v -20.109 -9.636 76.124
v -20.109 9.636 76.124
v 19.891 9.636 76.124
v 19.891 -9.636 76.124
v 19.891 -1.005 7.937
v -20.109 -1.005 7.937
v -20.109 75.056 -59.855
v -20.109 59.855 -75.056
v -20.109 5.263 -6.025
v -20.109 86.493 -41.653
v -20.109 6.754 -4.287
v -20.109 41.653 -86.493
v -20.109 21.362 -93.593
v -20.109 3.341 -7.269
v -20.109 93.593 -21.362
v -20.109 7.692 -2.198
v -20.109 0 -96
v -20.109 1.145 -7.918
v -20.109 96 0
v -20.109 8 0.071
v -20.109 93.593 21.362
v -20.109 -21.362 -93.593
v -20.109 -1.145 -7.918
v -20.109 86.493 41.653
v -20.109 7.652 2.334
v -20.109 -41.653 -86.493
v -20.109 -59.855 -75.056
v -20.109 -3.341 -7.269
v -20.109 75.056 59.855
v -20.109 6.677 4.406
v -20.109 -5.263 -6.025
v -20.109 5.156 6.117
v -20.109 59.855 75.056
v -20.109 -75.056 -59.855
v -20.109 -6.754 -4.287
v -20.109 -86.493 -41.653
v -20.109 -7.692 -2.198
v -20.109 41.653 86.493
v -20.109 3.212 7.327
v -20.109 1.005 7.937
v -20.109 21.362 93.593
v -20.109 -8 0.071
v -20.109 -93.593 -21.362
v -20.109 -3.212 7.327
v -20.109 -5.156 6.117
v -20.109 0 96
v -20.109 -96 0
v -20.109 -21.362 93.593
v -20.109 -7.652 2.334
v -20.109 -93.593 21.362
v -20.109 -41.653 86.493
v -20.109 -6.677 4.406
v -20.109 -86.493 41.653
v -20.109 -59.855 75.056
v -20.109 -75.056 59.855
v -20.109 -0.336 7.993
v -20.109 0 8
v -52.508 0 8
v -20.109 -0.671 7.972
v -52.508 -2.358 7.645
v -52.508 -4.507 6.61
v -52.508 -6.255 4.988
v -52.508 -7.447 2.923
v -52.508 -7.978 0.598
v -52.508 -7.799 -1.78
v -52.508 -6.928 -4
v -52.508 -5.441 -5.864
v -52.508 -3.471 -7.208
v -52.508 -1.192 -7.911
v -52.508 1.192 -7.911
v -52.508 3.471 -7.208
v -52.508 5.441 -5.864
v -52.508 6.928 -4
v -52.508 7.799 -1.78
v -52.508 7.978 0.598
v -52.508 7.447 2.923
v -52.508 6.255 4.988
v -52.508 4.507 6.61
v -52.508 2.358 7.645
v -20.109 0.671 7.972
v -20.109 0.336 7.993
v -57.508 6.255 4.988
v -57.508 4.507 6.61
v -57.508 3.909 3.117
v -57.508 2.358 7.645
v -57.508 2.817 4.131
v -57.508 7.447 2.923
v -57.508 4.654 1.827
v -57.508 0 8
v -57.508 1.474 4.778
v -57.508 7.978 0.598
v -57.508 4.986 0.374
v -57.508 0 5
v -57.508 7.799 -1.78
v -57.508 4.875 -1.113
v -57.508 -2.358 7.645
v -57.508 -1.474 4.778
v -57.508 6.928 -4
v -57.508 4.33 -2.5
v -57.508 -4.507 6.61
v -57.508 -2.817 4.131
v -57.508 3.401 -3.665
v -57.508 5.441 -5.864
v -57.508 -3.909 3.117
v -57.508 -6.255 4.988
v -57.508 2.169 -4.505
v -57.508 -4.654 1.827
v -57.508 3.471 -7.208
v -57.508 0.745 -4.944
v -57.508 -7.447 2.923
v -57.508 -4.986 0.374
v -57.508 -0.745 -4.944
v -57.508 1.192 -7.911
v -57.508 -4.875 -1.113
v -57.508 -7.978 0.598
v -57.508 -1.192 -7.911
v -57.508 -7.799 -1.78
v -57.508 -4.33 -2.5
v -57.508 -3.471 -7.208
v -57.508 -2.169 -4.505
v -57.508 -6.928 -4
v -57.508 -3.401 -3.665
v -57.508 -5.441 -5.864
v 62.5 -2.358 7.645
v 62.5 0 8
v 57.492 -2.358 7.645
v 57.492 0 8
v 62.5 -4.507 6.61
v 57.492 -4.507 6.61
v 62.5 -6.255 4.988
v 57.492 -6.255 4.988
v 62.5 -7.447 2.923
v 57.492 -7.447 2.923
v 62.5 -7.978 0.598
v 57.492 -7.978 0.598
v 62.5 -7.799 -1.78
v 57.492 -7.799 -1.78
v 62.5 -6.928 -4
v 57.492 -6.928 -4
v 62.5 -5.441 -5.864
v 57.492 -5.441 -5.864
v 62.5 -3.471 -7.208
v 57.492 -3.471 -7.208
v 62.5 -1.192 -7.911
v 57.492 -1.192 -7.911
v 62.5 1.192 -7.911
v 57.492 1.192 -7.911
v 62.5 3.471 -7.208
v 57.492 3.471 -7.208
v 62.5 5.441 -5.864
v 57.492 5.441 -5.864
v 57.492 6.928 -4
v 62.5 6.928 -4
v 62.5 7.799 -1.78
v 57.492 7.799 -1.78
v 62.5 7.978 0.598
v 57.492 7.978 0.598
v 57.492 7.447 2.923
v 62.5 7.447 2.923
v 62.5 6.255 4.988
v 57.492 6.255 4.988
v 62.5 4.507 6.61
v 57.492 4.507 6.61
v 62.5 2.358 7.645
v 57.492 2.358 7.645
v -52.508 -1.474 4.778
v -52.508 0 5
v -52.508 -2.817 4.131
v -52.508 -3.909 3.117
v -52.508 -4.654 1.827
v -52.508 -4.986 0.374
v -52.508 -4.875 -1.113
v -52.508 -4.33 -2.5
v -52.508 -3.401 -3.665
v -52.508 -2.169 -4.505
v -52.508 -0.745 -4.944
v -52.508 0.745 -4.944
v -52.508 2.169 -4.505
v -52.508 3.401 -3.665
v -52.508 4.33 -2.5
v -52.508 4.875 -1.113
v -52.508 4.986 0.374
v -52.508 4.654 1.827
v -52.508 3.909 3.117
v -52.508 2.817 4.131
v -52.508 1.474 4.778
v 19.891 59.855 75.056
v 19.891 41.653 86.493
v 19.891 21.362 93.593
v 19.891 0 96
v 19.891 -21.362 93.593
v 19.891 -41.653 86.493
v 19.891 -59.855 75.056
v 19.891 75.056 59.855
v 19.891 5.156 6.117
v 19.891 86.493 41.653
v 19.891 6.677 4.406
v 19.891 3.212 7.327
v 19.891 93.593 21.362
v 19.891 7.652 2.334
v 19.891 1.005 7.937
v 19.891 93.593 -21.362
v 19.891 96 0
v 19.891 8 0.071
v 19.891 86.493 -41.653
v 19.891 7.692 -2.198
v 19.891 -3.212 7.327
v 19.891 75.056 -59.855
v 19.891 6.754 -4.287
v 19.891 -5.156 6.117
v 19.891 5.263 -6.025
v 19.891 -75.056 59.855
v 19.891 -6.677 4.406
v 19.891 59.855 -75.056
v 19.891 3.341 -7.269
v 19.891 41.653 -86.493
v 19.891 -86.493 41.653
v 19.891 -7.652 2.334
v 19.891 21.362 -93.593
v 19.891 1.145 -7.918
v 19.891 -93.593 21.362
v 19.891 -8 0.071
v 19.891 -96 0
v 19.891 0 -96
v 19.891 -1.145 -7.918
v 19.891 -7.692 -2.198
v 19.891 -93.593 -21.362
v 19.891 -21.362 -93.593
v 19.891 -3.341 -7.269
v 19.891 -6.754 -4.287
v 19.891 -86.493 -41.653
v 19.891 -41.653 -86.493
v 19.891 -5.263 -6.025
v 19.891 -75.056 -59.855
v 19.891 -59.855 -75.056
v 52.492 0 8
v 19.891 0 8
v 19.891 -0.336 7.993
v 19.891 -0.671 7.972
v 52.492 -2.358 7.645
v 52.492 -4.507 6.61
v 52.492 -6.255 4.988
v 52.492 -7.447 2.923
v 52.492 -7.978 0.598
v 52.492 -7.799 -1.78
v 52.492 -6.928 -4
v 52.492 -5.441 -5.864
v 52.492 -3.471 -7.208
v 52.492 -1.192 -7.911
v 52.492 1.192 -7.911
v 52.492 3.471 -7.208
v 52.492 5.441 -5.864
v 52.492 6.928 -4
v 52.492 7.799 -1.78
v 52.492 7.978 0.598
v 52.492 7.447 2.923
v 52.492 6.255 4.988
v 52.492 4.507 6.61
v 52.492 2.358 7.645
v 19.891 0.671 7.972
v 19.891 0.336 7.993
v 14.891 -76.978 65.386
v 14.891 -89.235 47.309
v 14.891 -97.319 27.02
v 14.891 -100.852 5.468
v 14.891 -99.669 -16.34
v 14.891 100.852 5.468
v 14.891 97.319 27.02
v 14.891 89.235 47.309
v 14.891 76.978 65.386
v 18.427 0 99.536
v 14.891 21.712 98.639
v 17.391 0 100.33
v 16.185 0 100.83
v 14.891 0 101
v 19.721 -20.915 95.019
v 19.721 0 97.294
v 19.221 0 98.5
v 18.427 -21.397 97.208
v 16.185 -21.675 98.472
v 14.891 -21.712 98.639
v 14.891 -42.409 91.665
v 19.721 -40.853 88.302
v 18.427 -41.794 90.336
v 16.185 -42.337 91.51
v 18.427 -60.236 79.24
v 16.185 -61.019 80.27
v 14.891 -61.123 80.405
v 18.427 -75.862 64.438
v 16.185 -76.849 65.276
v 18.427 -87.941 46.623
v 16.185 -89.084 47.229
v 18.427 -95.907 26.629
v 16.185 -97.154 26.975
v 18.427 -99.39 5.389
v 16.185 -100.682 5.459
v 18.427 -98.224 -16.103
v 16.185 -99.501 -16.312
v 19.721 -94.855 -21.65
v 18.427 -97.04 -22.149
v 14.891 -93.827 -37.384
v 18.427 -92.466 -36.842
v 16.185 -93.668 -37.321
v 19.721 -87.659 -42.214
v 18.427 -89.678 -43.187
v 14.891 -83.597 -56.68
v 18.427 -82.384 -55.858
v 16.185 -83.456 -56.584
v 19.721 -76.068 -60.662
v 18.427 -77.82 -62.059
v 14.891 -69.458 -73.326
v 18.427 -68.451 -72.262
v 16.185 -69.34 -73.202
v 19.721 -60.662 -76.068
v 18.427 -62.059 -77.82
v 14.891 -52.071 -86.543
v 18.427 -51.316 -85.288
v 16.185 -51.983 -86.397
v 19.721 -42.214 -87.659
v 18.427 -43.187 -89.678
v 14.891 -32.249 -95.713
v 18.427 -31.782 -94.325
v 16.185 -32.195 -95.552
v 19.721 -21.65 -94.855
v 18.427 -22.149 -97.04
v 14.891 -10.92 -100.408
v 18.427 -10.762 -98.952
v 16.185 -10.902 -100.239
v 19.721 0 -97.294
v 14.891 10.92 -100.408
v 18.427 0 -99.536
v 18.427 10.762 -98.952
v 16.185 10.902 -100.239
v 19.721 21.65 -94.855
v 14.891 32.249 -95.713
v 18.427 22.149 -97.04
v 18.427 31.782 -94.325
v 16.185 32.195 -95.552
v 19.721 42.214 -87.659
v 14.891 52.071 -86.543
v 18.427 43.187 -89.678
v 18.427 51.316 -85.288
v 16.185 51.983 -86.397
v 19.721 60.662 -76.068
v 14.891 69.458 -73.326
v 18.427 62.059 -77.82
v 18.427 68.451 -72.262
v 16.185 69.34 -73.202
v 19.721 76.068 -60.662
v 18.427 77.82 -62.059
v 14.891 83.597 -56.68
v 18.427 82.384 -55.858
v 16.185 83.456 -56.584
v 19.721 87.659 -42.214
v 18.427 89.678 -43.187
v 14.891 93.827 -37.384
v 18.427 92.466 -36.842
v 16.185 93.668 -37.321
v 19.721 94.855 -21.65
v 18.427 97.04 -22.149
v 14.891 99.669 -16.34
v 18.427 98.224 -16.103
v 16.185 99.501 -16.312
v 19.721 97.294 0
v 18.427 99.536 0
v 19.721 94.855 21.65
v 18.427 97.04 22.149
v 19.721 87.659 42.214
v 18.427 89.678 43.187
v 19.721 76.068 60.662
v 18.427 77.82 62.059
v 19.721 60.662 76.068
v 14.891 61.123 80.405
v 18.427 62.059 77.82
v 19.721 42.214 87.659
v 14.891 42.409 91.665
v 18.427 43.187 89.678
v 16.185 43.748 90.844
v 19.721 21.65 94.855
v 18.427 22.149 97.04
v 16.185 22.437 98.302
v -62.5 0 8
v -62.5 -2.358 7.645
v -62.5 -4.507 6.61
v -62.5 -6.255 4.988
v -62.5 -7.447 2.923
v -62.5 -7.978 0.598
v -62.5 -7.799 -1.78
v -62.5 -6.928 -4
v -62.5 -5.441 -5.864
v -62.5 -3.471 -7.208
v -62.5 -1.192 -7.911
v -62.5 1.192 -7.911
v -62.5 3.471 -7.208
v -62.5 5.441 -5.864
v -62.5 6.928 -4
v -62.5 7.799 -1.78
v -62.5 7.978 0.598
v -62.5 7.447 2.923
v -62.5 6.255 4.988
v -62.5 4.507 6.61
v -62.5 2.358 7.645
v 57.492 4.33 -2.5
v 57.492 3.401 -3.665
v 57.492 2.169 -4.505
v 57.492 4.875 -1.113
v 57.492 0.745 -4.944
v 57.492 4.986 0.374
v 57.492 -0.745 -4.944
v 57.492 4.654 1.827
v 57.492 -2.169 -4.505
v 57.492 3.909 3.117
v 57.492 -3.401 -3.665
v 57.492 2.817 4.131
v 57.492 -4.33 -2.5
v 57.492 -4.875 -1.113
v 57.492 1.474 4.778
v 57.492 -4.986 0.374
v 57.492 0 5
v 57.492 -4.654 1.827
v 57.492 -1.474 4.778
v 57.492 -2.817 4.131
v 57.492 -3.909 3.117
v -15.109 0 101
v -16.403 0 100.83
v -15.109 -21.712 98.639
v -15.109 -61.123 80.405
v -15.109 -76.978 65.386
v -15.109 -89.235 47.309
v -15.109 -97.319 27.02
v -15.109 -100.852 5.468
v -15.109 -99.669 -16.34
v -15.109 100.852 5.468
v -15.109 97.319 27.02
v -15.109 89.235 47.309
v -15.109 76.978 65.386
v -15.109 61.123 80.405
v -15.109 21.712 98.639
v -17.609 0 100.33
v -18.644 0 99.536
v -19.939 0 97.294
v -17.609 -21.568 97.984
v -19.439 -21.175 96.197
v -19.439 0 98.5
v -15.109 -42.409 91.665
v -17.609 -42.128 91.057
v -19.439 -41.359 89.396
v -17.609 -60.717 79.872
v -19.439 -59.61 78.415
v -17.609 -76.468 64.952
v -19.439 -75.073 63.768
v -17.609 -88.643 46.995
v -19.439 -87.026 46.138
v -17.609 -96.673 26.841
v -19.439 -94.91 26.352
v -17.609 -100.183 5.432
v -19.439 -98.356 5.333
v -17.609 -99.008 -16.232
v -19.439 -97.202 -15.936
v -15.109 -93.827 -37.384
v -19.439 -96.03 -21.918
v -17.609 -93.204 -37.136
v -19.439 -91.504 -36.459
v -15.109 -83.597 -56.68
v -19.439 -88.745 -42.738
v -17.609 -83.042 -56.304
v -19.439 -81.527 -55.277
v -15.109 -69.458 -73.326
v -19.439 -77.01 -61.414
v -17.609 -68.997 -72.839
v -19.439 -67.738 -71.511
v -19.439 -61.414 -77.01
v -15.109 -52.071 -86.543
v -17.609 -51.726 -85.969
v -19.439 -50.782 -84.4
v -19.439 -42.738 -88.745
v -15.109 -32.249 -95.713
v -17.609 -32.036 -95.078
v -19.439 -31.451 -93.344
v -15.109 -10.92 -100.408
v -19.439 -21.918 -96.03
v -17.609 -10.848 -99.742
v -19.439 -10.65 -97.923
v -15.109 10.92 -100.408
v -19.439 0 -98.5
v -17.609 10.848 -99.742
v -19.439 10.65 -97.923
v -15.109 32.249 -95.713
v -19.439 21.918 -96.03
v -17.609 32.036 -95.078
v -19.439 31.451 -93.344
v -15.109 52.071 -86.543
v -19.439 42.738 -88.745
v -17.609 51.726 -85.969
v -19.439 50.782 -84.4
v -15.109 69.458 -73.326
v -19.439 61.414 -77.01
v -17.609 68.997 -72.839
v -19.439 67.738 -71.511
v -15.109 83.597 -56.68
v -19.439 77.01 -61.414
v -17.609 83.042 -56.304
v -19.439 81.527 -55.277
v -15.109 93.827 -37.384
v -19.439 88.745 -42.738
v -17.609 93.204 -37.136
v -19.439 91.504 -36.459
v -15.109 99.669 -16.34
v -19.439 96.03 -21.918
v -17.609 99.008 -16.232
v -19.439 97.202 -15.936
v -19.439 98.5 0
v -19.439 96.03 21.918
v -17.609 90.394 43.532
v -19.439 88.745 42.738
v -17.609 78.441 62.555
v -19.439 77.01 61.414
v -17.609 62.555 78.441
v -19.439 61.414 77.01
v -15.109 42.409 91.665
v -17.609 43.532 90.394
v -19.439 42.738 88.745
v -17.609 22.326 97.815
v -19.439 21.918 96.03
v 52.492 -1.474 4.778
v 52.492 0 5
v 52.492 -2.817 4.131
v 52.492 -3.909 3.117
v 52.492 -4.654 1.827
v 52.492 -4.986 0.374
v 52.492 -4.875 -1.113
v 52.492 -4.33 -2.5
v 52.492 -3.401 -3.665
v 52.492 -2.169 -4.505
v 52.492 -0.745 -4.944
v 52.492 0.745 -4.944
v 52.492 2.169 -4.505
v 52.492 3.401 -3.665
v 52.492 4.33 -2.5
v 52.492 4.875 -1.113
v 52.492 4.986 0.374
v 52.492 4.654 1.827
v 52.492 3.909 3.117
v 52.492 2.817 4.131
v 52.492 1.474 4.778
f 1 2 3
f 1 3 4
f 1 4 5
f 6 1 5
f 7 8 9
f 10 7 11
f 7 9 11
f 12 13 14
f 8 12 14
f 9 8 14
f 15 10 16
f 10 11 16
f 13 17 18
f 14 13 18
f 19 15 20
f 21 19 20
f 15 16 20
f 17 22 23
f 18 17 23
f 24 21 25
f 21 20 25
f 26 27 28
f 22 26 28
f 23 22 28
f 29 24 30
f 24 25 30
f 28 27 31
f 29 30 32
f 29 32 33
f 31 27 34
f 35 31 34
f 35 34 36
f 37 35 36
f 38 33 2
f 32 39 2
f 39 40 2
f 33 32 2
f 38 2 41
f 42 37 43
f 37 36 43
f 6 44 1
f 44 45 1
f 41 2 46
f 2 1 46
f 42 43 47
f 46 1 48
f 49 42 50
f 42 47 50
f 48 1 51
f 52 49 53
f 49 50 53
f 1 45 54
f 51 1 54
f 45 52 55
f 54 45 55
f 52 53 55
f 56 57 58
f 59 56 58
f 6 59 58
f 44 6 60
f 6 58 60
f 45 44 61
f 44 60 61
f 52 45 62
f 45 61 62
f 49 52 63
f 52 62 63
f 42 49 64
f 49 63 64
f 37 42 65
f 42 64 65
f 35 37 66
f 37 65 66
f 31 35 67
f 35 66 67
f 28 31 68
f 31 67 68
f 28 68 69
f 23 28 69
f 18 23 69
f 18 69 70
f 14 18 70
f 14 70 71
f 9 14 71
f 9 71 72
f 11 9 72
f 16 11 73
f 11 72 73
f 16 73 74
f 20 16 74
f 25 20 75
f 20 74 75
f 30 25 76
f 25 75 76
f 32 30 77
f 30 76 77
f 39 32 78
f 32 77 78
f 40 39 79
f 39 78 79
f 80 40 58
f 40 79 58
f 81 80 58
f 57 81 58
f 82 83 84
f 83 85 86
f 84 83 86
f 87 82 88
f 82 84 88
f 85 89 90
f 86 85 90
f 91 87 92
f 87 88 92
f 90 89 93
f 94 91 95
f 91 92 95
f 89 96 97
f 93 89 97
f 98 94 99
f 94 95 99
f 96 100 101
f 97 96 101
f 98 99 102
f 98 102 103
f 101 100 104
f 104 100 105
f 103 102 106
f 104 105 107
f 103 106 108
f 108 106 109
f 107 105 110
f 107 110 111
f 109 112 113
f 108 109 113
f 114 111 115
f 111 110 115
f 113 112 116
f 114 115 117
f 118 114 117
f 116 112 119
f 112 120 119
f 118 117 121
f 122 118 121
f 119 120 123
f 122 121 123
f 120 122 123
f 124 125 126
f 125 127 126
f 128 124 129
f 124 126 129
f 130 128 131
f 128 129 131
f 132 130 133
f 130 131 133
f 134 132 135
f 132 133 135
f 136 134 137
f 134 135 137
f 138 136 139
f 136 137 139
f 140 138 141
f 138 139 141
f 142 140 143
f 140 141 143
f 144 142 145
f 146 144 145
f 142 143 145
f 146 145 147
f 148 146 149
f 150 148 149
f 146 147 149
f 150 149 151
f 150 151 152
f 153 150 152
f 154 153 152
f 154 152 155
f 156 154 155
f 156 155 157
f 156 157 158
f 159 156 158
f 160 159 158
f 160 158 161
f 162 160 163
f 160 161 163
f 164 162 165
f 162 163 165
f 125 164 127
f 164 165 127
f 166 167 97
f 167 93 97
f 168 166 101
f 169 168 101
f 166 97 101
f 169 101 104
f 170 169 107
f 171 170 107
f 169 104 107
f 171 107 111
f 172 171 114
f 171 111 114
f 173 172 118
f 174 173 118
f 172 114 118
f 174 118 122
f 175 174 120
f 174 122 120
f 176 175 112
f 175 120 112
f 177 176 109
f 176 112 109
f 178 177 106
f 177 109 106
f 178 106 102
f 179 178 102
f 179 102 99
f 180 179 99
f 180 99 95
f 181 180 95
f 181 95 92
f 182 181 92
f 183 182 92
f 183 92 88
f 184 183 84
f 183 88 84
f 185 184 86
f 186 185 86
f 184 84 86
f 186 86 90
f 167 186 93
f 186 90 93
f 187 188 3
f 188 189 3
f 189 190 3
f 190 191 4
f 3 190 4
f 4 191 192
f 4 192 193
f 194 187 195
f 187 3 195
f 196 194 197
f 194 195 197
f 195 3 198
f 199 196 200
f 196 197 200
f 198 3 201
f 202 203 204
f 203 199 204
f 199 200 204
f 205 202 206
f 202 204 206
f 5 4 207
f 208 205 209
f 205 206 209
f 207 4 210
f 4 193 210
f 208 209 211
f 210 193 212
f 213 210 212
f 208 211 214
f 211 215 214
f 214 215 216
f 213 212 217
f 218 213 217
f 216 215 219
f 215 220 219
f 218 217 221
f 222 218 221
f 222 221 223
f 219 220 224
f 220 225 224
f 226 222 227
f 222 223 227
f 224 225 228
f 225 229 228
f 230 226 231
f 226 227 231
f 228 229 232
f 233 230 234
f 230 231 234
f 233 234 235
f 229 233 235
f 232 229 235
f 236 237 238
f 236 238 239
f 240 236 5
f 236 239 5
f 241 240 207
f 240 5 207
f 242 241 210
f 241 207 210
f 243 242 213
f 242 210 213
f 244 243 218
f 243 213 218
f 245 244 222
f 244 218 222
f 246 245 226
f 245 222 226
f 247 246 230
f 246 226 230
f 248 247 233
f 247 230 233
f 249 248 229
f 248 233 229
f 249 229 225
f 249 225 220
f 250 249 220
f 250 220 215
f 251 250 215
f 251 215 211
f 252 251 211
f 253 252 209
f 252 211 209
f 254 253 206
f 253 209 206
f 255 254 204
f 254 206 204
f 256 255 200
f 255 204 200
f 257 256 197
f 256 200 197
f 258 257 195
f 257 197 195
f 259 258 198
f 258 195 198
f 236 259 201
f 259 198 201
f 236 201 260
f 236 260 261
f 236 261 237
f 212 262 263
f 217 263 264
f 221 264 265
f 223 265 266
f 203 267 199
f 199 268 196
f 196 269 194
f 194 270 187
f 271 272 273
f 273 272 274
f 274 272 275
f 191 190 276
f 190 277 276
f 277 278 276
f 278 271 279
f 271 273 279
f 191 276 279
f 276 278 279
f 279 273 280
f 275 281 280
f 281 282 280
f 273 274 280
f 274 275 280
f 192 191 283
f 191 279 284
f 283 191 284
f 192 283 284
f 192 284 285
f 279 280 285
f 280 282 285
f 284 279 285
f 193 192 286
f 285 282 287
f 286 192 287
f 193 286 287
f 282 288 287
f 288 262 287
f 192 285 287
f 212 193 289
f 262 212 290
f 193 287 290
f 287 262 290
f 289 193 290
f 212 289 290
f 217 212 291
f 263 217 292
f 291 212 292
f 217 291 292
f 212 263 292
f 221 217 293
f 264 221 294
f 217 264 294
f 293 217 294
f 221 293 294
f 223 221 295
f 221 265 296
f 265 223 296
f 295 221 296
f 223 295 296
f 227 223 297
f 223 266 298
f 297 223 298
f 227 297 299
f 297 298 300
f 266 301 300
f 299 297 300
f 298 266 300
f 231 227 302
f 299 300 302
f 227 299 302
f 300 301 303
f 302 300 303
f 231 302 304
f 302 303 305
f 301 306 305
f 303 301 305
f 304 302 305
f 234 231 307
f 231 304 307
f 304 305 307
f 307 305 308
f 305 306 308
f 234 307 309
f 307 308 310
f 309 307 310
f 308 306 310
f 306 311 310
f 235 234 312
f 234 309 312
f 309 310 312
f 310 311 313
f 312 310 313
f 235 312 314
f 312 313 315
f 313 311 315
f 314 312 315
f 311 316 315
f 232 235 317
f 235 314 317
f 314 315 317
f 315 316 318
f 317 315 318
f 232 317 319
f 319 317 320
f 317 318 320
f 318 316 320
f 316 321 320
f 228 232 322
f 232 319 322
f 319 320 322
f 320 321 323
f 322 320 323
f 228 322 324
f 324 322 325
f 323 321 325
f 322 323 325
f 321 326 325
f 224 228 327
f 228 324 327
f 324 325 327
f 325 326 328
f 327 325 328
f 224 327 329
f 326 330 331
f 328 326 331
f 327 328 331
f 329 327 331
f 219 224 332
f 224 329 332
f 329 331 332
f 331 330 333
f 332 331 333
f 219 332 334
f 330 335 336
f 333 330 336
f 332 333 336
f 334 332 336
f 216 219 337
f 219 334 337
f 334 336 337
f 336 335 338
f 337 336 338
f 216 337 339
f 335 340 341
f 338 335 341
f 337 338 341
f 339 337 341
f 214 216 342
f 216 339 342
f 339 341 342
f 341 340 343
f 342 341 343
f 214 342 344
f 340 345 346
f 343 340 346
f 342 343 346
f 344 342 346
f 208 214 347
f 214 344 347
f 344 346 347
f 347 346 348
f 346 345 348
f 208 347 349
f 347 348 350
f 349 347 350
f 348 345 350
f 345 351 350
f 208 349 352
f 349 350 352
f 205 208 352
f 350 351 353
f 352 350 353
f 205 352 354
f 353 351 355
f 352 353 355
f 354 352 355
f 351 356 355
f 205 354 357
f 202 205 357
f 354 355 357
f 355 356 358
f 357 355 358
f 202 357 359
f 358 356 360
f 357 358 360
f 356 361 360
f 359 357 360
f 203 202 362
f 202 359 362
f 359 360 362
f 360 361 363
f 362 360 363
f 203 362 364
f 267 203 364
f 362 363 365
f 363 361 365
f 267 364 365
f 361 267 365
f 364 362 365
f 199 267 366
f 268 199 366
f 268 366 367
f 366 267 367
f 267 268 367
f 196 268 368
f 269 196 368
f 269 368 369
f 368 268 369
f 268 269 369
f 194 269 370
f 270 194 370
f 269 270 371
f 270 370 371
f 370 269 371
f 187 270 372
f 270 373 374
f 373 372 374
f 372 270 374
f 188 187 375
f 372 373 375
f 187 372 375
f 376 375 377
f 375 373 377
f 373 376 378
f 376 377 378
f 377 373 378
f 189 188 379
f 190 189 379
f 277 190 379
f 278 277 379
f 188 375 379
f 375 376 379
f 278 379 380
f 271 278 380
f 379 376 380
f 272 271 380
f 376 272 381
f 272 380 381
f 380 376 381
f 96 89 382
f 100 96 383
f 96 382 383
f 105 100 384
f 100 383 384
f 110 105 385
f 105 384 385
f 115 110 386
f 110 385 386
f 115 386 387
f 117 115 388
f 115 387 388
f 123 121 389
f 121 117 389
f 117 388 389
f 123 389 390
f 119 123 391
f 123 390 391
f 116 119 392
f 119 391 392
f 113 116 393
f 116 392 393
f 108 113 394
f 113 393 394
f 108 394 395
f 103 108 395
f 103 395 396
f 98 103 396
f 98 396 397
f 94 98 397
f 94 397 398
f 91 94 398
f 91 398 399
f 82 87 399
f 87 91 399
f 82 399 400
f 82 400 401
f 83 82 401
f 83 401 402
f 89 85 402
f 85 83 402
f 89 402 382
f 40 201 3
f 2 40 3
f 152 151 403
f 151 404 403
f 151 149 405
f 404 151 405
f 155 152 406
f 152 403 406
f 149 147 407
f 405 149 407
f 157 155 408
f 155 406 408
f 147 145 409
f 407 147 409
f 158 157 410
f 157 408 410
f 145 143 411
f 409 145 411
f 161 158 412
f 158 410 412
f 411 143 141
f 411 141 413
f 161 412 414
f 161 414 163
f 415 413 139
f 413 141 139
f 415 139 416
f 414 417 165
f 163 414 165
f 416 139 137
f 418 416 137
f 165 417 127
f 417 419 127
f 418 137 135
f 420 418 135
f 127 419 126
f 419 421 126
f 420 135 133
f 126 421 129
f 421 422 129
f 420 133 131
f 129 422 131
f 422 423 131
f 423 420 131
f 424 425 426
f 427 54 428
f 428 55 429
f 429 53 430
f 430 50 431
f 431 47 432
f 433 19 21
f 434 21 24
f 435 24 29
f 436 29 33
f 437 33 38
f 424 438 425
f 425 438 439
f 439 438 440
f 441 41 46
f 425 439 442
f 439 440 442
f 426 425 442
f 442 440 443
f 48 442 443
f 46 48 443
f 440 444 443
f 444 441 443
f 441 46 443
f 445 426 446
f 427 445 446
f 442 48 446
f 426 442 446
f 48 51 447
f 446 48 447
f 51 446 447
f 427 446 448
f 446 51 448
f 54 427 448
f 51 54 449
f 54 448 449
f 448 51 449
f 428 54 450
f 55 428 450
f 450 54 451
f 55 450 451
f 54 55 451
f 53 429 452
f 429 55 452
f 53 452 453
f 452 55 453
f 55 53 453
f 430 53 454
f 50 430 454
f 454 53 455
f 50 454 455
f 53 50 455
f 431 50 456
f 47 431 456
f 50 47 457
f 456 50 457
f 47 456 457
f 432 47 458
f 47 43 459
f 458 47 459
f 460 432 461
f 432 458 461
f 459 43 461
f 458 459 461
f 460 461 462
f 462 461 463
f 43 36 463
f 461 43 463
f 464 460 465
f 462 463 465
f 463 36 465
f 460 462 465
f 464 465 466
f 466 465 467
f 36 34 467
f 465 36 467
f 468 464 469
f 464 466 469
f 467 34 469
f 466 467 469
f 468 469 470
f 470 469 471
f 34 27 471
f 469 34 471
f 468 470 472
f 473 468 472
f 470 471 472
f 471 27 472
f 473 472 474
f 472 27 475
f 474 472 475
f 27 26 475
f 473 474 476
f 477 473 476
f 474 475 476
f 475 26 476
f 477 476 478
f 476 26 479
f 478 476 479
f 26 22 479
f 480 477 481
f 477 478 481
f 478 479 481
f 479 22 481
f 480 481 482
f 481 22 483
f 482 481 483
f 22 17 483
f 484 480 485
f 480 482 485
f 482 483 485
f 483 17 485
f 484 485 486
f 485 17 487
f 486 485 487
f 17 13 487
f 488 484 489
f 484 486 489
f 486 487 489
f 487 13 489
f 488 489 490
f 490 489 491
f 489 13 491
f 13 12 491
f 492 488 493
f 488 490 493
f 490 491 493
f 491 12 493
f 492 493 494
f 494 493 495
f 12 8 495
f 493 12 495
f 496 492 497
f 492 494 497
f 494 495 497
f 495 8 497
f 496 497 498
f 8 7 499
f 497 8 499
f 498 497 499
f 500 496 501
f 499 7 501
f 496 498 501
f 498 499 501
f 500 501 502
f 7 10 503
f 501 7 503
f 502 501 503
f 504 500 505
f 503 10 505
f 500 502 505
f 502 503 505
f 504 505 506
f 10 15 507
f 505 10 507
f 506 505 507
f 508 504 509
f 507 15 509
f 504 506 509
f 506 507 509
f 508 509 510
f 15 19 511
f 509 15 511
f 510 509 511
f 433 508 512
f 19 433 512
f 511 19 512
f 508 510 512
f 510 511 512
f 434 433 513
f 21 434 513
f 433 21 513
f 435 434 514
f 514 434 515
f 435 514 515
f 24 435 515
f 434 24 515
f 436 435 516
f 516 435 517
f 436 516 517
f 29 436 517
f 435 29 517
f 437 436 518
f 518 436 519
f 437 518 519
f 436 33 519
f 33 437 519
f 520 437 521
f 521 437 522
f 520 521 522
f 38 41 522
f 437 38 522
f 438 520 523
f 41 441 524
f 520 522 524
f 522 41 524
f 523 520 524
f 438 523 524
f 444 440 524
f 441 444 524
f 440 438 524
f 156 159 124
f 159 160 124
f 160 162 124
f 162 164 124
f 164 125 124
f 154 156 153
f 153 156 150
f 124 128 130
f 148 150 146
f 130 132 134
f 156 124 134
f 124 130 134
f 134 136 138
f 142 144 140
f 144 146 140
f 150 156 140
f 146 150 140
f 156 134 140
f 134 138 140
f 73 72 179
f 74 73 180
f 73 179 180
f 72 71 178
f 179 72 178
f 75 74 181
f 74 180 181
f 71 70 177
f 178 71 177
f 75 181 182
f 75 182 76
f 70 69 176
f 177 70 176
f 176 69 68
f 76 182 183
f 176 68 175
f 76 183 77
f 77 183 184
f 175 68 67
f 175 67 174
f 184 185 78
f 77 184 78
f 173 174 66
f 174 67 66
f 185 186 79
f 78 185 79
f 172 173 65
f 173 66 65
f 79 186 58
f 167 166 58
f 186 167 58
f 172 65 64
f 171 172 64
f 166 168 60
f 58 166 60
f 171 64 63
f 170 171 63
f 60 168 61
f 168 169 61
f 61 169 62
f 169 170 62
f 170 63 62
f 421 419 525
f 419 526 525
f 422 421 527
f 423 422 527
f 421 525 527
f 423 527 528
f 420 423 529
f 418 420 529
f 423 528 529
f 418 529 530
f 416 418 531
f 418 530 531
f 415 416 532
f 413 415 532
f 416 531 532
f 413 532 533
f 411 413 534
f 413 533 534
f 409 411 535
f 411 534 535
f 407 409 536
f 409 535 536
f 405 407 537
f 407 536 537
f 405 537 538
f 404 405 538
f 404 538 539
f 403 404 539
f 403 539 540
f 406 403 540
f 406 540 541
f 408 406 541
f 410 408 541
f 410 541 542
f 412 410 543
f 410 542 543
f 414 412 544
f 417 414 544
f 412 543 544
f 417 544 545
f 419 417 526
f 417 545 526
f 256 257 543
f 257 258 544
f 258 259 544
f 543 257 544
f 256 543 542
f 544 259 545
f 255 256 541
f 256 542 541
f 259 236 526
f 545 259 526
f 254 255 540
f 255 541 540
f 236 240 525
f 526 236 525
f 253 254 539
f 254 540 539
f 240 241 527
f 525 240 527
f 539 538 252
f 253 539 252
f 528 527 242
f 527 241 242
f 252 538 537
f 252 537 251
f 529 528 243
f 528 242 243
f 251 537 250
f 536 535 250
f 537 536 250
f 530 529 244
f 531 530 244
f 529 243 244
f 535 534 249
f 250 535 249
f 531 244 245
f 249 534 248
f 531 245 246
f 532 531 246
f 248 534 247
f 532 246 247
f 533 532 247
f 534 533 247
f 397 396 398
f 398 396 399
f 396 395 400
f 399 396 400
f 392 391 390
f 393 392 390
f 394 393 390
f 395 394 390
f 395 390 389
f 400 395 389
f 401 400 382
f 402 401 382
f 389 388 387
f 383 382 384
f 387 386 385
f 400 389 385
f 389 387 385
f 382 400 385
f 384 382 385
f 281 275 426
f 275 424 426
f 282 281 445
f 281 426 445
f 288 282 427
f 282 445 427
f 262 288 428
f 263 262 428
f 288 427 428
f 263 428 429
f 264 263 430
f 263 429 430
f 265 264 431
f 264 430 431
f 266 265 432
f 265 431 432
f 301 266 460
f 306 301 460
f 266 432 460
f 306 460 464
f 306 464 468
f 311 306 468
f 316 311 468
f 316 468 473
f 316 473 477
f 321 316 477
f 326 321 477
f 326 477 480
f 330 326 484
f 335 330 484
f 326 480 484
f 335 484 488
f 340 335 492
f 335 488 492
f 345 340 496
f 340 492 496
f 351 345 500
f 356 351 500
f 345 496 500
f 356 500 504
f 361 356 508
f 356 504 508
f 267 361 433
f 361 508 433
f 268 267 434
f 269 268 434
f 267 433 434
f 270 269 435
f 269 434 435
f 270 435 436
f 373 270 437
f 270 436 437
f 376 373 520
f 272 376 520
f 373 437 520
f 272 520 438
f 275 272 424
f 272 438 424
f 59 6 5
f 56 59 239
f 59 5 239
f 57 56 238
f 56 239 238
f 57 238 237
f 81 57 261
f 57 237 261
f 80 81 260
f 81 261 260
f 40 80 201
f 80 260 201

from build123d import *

# Parameters (mm, degrees)
F3_DEPTH = 82.392052


with BuildPart() as f1:
    # F0 (on Front) → F1 (revolve)
    with BuildSketch(Plane.XZ):
        with BuildLine():
            Line((-57.507594, 8), (-62.5, 8))
            Line((-62.5, 8), (-62.5, 0))
            Line((-62.5, 0), (-20.108948, 0))
            Line((-20.108948, 0), (19.891052, 0))
            Line((19.891052, 0), (62.5, 0))
            Line((62.5, 0), (62.5, 8))
            Line((62.5, 8), (57.492453, 8))
            Line((57.492453, 8), (57.492453, 5))
            Line((57.492453, 5), (52.492453, 5))
            Line((52.492453, 5), (52.492453, 8))
            Line((52.492453, 8), (19.891052, 8))
            Line((19.891052, 8), (19.891052, 96))
            ThreePointArc((19.891052, 96), (18.426586, 99.535534), (14.891052, 101))
            Line((14.891052, 101), (-15.108948, 101))
            ThreePointArc((-15.108948, 101), (-18.644481, 99.535534), (-20.108948, 96))
            Line((-20.108948, 96), (-20.108948, 8))
            Line((-20.108948, 8), (-52.507594, 8))
            Line((-52.507594, 8), (-52.507594, 5))
            Line((-52.507594, 5), (-57.507594, 5))
            Line((-57.507594, 5), (-57.507594, 8))
        make_face()
    revolve(axis=Axis((-6.764503, 0, 0), (1, 0, 0)))

    # F2 (on face) → F3 (cut, through all)
    with BuildSketch(Plane.YZ.offset(19.891052)):
        with BuildLine():
            Line((-9.635893, 76.123558), (-1.004641, 7.936668))
            ThreePointArc((-1.004641, 7.936668), (0, 8), (1.004641, 7.936668))
            Line((1.004641, 7.936668), (9.635893, 76.123558))
            Line((9.635893, 76.123558), (0, 76.123558))
            Line((0, 76.123558), (-9.635893, 76.123558))
        make_face()
    extrude(amount=-F3_DEPTH, mode=Mode.SUBTRACT)


solid = f1.part
